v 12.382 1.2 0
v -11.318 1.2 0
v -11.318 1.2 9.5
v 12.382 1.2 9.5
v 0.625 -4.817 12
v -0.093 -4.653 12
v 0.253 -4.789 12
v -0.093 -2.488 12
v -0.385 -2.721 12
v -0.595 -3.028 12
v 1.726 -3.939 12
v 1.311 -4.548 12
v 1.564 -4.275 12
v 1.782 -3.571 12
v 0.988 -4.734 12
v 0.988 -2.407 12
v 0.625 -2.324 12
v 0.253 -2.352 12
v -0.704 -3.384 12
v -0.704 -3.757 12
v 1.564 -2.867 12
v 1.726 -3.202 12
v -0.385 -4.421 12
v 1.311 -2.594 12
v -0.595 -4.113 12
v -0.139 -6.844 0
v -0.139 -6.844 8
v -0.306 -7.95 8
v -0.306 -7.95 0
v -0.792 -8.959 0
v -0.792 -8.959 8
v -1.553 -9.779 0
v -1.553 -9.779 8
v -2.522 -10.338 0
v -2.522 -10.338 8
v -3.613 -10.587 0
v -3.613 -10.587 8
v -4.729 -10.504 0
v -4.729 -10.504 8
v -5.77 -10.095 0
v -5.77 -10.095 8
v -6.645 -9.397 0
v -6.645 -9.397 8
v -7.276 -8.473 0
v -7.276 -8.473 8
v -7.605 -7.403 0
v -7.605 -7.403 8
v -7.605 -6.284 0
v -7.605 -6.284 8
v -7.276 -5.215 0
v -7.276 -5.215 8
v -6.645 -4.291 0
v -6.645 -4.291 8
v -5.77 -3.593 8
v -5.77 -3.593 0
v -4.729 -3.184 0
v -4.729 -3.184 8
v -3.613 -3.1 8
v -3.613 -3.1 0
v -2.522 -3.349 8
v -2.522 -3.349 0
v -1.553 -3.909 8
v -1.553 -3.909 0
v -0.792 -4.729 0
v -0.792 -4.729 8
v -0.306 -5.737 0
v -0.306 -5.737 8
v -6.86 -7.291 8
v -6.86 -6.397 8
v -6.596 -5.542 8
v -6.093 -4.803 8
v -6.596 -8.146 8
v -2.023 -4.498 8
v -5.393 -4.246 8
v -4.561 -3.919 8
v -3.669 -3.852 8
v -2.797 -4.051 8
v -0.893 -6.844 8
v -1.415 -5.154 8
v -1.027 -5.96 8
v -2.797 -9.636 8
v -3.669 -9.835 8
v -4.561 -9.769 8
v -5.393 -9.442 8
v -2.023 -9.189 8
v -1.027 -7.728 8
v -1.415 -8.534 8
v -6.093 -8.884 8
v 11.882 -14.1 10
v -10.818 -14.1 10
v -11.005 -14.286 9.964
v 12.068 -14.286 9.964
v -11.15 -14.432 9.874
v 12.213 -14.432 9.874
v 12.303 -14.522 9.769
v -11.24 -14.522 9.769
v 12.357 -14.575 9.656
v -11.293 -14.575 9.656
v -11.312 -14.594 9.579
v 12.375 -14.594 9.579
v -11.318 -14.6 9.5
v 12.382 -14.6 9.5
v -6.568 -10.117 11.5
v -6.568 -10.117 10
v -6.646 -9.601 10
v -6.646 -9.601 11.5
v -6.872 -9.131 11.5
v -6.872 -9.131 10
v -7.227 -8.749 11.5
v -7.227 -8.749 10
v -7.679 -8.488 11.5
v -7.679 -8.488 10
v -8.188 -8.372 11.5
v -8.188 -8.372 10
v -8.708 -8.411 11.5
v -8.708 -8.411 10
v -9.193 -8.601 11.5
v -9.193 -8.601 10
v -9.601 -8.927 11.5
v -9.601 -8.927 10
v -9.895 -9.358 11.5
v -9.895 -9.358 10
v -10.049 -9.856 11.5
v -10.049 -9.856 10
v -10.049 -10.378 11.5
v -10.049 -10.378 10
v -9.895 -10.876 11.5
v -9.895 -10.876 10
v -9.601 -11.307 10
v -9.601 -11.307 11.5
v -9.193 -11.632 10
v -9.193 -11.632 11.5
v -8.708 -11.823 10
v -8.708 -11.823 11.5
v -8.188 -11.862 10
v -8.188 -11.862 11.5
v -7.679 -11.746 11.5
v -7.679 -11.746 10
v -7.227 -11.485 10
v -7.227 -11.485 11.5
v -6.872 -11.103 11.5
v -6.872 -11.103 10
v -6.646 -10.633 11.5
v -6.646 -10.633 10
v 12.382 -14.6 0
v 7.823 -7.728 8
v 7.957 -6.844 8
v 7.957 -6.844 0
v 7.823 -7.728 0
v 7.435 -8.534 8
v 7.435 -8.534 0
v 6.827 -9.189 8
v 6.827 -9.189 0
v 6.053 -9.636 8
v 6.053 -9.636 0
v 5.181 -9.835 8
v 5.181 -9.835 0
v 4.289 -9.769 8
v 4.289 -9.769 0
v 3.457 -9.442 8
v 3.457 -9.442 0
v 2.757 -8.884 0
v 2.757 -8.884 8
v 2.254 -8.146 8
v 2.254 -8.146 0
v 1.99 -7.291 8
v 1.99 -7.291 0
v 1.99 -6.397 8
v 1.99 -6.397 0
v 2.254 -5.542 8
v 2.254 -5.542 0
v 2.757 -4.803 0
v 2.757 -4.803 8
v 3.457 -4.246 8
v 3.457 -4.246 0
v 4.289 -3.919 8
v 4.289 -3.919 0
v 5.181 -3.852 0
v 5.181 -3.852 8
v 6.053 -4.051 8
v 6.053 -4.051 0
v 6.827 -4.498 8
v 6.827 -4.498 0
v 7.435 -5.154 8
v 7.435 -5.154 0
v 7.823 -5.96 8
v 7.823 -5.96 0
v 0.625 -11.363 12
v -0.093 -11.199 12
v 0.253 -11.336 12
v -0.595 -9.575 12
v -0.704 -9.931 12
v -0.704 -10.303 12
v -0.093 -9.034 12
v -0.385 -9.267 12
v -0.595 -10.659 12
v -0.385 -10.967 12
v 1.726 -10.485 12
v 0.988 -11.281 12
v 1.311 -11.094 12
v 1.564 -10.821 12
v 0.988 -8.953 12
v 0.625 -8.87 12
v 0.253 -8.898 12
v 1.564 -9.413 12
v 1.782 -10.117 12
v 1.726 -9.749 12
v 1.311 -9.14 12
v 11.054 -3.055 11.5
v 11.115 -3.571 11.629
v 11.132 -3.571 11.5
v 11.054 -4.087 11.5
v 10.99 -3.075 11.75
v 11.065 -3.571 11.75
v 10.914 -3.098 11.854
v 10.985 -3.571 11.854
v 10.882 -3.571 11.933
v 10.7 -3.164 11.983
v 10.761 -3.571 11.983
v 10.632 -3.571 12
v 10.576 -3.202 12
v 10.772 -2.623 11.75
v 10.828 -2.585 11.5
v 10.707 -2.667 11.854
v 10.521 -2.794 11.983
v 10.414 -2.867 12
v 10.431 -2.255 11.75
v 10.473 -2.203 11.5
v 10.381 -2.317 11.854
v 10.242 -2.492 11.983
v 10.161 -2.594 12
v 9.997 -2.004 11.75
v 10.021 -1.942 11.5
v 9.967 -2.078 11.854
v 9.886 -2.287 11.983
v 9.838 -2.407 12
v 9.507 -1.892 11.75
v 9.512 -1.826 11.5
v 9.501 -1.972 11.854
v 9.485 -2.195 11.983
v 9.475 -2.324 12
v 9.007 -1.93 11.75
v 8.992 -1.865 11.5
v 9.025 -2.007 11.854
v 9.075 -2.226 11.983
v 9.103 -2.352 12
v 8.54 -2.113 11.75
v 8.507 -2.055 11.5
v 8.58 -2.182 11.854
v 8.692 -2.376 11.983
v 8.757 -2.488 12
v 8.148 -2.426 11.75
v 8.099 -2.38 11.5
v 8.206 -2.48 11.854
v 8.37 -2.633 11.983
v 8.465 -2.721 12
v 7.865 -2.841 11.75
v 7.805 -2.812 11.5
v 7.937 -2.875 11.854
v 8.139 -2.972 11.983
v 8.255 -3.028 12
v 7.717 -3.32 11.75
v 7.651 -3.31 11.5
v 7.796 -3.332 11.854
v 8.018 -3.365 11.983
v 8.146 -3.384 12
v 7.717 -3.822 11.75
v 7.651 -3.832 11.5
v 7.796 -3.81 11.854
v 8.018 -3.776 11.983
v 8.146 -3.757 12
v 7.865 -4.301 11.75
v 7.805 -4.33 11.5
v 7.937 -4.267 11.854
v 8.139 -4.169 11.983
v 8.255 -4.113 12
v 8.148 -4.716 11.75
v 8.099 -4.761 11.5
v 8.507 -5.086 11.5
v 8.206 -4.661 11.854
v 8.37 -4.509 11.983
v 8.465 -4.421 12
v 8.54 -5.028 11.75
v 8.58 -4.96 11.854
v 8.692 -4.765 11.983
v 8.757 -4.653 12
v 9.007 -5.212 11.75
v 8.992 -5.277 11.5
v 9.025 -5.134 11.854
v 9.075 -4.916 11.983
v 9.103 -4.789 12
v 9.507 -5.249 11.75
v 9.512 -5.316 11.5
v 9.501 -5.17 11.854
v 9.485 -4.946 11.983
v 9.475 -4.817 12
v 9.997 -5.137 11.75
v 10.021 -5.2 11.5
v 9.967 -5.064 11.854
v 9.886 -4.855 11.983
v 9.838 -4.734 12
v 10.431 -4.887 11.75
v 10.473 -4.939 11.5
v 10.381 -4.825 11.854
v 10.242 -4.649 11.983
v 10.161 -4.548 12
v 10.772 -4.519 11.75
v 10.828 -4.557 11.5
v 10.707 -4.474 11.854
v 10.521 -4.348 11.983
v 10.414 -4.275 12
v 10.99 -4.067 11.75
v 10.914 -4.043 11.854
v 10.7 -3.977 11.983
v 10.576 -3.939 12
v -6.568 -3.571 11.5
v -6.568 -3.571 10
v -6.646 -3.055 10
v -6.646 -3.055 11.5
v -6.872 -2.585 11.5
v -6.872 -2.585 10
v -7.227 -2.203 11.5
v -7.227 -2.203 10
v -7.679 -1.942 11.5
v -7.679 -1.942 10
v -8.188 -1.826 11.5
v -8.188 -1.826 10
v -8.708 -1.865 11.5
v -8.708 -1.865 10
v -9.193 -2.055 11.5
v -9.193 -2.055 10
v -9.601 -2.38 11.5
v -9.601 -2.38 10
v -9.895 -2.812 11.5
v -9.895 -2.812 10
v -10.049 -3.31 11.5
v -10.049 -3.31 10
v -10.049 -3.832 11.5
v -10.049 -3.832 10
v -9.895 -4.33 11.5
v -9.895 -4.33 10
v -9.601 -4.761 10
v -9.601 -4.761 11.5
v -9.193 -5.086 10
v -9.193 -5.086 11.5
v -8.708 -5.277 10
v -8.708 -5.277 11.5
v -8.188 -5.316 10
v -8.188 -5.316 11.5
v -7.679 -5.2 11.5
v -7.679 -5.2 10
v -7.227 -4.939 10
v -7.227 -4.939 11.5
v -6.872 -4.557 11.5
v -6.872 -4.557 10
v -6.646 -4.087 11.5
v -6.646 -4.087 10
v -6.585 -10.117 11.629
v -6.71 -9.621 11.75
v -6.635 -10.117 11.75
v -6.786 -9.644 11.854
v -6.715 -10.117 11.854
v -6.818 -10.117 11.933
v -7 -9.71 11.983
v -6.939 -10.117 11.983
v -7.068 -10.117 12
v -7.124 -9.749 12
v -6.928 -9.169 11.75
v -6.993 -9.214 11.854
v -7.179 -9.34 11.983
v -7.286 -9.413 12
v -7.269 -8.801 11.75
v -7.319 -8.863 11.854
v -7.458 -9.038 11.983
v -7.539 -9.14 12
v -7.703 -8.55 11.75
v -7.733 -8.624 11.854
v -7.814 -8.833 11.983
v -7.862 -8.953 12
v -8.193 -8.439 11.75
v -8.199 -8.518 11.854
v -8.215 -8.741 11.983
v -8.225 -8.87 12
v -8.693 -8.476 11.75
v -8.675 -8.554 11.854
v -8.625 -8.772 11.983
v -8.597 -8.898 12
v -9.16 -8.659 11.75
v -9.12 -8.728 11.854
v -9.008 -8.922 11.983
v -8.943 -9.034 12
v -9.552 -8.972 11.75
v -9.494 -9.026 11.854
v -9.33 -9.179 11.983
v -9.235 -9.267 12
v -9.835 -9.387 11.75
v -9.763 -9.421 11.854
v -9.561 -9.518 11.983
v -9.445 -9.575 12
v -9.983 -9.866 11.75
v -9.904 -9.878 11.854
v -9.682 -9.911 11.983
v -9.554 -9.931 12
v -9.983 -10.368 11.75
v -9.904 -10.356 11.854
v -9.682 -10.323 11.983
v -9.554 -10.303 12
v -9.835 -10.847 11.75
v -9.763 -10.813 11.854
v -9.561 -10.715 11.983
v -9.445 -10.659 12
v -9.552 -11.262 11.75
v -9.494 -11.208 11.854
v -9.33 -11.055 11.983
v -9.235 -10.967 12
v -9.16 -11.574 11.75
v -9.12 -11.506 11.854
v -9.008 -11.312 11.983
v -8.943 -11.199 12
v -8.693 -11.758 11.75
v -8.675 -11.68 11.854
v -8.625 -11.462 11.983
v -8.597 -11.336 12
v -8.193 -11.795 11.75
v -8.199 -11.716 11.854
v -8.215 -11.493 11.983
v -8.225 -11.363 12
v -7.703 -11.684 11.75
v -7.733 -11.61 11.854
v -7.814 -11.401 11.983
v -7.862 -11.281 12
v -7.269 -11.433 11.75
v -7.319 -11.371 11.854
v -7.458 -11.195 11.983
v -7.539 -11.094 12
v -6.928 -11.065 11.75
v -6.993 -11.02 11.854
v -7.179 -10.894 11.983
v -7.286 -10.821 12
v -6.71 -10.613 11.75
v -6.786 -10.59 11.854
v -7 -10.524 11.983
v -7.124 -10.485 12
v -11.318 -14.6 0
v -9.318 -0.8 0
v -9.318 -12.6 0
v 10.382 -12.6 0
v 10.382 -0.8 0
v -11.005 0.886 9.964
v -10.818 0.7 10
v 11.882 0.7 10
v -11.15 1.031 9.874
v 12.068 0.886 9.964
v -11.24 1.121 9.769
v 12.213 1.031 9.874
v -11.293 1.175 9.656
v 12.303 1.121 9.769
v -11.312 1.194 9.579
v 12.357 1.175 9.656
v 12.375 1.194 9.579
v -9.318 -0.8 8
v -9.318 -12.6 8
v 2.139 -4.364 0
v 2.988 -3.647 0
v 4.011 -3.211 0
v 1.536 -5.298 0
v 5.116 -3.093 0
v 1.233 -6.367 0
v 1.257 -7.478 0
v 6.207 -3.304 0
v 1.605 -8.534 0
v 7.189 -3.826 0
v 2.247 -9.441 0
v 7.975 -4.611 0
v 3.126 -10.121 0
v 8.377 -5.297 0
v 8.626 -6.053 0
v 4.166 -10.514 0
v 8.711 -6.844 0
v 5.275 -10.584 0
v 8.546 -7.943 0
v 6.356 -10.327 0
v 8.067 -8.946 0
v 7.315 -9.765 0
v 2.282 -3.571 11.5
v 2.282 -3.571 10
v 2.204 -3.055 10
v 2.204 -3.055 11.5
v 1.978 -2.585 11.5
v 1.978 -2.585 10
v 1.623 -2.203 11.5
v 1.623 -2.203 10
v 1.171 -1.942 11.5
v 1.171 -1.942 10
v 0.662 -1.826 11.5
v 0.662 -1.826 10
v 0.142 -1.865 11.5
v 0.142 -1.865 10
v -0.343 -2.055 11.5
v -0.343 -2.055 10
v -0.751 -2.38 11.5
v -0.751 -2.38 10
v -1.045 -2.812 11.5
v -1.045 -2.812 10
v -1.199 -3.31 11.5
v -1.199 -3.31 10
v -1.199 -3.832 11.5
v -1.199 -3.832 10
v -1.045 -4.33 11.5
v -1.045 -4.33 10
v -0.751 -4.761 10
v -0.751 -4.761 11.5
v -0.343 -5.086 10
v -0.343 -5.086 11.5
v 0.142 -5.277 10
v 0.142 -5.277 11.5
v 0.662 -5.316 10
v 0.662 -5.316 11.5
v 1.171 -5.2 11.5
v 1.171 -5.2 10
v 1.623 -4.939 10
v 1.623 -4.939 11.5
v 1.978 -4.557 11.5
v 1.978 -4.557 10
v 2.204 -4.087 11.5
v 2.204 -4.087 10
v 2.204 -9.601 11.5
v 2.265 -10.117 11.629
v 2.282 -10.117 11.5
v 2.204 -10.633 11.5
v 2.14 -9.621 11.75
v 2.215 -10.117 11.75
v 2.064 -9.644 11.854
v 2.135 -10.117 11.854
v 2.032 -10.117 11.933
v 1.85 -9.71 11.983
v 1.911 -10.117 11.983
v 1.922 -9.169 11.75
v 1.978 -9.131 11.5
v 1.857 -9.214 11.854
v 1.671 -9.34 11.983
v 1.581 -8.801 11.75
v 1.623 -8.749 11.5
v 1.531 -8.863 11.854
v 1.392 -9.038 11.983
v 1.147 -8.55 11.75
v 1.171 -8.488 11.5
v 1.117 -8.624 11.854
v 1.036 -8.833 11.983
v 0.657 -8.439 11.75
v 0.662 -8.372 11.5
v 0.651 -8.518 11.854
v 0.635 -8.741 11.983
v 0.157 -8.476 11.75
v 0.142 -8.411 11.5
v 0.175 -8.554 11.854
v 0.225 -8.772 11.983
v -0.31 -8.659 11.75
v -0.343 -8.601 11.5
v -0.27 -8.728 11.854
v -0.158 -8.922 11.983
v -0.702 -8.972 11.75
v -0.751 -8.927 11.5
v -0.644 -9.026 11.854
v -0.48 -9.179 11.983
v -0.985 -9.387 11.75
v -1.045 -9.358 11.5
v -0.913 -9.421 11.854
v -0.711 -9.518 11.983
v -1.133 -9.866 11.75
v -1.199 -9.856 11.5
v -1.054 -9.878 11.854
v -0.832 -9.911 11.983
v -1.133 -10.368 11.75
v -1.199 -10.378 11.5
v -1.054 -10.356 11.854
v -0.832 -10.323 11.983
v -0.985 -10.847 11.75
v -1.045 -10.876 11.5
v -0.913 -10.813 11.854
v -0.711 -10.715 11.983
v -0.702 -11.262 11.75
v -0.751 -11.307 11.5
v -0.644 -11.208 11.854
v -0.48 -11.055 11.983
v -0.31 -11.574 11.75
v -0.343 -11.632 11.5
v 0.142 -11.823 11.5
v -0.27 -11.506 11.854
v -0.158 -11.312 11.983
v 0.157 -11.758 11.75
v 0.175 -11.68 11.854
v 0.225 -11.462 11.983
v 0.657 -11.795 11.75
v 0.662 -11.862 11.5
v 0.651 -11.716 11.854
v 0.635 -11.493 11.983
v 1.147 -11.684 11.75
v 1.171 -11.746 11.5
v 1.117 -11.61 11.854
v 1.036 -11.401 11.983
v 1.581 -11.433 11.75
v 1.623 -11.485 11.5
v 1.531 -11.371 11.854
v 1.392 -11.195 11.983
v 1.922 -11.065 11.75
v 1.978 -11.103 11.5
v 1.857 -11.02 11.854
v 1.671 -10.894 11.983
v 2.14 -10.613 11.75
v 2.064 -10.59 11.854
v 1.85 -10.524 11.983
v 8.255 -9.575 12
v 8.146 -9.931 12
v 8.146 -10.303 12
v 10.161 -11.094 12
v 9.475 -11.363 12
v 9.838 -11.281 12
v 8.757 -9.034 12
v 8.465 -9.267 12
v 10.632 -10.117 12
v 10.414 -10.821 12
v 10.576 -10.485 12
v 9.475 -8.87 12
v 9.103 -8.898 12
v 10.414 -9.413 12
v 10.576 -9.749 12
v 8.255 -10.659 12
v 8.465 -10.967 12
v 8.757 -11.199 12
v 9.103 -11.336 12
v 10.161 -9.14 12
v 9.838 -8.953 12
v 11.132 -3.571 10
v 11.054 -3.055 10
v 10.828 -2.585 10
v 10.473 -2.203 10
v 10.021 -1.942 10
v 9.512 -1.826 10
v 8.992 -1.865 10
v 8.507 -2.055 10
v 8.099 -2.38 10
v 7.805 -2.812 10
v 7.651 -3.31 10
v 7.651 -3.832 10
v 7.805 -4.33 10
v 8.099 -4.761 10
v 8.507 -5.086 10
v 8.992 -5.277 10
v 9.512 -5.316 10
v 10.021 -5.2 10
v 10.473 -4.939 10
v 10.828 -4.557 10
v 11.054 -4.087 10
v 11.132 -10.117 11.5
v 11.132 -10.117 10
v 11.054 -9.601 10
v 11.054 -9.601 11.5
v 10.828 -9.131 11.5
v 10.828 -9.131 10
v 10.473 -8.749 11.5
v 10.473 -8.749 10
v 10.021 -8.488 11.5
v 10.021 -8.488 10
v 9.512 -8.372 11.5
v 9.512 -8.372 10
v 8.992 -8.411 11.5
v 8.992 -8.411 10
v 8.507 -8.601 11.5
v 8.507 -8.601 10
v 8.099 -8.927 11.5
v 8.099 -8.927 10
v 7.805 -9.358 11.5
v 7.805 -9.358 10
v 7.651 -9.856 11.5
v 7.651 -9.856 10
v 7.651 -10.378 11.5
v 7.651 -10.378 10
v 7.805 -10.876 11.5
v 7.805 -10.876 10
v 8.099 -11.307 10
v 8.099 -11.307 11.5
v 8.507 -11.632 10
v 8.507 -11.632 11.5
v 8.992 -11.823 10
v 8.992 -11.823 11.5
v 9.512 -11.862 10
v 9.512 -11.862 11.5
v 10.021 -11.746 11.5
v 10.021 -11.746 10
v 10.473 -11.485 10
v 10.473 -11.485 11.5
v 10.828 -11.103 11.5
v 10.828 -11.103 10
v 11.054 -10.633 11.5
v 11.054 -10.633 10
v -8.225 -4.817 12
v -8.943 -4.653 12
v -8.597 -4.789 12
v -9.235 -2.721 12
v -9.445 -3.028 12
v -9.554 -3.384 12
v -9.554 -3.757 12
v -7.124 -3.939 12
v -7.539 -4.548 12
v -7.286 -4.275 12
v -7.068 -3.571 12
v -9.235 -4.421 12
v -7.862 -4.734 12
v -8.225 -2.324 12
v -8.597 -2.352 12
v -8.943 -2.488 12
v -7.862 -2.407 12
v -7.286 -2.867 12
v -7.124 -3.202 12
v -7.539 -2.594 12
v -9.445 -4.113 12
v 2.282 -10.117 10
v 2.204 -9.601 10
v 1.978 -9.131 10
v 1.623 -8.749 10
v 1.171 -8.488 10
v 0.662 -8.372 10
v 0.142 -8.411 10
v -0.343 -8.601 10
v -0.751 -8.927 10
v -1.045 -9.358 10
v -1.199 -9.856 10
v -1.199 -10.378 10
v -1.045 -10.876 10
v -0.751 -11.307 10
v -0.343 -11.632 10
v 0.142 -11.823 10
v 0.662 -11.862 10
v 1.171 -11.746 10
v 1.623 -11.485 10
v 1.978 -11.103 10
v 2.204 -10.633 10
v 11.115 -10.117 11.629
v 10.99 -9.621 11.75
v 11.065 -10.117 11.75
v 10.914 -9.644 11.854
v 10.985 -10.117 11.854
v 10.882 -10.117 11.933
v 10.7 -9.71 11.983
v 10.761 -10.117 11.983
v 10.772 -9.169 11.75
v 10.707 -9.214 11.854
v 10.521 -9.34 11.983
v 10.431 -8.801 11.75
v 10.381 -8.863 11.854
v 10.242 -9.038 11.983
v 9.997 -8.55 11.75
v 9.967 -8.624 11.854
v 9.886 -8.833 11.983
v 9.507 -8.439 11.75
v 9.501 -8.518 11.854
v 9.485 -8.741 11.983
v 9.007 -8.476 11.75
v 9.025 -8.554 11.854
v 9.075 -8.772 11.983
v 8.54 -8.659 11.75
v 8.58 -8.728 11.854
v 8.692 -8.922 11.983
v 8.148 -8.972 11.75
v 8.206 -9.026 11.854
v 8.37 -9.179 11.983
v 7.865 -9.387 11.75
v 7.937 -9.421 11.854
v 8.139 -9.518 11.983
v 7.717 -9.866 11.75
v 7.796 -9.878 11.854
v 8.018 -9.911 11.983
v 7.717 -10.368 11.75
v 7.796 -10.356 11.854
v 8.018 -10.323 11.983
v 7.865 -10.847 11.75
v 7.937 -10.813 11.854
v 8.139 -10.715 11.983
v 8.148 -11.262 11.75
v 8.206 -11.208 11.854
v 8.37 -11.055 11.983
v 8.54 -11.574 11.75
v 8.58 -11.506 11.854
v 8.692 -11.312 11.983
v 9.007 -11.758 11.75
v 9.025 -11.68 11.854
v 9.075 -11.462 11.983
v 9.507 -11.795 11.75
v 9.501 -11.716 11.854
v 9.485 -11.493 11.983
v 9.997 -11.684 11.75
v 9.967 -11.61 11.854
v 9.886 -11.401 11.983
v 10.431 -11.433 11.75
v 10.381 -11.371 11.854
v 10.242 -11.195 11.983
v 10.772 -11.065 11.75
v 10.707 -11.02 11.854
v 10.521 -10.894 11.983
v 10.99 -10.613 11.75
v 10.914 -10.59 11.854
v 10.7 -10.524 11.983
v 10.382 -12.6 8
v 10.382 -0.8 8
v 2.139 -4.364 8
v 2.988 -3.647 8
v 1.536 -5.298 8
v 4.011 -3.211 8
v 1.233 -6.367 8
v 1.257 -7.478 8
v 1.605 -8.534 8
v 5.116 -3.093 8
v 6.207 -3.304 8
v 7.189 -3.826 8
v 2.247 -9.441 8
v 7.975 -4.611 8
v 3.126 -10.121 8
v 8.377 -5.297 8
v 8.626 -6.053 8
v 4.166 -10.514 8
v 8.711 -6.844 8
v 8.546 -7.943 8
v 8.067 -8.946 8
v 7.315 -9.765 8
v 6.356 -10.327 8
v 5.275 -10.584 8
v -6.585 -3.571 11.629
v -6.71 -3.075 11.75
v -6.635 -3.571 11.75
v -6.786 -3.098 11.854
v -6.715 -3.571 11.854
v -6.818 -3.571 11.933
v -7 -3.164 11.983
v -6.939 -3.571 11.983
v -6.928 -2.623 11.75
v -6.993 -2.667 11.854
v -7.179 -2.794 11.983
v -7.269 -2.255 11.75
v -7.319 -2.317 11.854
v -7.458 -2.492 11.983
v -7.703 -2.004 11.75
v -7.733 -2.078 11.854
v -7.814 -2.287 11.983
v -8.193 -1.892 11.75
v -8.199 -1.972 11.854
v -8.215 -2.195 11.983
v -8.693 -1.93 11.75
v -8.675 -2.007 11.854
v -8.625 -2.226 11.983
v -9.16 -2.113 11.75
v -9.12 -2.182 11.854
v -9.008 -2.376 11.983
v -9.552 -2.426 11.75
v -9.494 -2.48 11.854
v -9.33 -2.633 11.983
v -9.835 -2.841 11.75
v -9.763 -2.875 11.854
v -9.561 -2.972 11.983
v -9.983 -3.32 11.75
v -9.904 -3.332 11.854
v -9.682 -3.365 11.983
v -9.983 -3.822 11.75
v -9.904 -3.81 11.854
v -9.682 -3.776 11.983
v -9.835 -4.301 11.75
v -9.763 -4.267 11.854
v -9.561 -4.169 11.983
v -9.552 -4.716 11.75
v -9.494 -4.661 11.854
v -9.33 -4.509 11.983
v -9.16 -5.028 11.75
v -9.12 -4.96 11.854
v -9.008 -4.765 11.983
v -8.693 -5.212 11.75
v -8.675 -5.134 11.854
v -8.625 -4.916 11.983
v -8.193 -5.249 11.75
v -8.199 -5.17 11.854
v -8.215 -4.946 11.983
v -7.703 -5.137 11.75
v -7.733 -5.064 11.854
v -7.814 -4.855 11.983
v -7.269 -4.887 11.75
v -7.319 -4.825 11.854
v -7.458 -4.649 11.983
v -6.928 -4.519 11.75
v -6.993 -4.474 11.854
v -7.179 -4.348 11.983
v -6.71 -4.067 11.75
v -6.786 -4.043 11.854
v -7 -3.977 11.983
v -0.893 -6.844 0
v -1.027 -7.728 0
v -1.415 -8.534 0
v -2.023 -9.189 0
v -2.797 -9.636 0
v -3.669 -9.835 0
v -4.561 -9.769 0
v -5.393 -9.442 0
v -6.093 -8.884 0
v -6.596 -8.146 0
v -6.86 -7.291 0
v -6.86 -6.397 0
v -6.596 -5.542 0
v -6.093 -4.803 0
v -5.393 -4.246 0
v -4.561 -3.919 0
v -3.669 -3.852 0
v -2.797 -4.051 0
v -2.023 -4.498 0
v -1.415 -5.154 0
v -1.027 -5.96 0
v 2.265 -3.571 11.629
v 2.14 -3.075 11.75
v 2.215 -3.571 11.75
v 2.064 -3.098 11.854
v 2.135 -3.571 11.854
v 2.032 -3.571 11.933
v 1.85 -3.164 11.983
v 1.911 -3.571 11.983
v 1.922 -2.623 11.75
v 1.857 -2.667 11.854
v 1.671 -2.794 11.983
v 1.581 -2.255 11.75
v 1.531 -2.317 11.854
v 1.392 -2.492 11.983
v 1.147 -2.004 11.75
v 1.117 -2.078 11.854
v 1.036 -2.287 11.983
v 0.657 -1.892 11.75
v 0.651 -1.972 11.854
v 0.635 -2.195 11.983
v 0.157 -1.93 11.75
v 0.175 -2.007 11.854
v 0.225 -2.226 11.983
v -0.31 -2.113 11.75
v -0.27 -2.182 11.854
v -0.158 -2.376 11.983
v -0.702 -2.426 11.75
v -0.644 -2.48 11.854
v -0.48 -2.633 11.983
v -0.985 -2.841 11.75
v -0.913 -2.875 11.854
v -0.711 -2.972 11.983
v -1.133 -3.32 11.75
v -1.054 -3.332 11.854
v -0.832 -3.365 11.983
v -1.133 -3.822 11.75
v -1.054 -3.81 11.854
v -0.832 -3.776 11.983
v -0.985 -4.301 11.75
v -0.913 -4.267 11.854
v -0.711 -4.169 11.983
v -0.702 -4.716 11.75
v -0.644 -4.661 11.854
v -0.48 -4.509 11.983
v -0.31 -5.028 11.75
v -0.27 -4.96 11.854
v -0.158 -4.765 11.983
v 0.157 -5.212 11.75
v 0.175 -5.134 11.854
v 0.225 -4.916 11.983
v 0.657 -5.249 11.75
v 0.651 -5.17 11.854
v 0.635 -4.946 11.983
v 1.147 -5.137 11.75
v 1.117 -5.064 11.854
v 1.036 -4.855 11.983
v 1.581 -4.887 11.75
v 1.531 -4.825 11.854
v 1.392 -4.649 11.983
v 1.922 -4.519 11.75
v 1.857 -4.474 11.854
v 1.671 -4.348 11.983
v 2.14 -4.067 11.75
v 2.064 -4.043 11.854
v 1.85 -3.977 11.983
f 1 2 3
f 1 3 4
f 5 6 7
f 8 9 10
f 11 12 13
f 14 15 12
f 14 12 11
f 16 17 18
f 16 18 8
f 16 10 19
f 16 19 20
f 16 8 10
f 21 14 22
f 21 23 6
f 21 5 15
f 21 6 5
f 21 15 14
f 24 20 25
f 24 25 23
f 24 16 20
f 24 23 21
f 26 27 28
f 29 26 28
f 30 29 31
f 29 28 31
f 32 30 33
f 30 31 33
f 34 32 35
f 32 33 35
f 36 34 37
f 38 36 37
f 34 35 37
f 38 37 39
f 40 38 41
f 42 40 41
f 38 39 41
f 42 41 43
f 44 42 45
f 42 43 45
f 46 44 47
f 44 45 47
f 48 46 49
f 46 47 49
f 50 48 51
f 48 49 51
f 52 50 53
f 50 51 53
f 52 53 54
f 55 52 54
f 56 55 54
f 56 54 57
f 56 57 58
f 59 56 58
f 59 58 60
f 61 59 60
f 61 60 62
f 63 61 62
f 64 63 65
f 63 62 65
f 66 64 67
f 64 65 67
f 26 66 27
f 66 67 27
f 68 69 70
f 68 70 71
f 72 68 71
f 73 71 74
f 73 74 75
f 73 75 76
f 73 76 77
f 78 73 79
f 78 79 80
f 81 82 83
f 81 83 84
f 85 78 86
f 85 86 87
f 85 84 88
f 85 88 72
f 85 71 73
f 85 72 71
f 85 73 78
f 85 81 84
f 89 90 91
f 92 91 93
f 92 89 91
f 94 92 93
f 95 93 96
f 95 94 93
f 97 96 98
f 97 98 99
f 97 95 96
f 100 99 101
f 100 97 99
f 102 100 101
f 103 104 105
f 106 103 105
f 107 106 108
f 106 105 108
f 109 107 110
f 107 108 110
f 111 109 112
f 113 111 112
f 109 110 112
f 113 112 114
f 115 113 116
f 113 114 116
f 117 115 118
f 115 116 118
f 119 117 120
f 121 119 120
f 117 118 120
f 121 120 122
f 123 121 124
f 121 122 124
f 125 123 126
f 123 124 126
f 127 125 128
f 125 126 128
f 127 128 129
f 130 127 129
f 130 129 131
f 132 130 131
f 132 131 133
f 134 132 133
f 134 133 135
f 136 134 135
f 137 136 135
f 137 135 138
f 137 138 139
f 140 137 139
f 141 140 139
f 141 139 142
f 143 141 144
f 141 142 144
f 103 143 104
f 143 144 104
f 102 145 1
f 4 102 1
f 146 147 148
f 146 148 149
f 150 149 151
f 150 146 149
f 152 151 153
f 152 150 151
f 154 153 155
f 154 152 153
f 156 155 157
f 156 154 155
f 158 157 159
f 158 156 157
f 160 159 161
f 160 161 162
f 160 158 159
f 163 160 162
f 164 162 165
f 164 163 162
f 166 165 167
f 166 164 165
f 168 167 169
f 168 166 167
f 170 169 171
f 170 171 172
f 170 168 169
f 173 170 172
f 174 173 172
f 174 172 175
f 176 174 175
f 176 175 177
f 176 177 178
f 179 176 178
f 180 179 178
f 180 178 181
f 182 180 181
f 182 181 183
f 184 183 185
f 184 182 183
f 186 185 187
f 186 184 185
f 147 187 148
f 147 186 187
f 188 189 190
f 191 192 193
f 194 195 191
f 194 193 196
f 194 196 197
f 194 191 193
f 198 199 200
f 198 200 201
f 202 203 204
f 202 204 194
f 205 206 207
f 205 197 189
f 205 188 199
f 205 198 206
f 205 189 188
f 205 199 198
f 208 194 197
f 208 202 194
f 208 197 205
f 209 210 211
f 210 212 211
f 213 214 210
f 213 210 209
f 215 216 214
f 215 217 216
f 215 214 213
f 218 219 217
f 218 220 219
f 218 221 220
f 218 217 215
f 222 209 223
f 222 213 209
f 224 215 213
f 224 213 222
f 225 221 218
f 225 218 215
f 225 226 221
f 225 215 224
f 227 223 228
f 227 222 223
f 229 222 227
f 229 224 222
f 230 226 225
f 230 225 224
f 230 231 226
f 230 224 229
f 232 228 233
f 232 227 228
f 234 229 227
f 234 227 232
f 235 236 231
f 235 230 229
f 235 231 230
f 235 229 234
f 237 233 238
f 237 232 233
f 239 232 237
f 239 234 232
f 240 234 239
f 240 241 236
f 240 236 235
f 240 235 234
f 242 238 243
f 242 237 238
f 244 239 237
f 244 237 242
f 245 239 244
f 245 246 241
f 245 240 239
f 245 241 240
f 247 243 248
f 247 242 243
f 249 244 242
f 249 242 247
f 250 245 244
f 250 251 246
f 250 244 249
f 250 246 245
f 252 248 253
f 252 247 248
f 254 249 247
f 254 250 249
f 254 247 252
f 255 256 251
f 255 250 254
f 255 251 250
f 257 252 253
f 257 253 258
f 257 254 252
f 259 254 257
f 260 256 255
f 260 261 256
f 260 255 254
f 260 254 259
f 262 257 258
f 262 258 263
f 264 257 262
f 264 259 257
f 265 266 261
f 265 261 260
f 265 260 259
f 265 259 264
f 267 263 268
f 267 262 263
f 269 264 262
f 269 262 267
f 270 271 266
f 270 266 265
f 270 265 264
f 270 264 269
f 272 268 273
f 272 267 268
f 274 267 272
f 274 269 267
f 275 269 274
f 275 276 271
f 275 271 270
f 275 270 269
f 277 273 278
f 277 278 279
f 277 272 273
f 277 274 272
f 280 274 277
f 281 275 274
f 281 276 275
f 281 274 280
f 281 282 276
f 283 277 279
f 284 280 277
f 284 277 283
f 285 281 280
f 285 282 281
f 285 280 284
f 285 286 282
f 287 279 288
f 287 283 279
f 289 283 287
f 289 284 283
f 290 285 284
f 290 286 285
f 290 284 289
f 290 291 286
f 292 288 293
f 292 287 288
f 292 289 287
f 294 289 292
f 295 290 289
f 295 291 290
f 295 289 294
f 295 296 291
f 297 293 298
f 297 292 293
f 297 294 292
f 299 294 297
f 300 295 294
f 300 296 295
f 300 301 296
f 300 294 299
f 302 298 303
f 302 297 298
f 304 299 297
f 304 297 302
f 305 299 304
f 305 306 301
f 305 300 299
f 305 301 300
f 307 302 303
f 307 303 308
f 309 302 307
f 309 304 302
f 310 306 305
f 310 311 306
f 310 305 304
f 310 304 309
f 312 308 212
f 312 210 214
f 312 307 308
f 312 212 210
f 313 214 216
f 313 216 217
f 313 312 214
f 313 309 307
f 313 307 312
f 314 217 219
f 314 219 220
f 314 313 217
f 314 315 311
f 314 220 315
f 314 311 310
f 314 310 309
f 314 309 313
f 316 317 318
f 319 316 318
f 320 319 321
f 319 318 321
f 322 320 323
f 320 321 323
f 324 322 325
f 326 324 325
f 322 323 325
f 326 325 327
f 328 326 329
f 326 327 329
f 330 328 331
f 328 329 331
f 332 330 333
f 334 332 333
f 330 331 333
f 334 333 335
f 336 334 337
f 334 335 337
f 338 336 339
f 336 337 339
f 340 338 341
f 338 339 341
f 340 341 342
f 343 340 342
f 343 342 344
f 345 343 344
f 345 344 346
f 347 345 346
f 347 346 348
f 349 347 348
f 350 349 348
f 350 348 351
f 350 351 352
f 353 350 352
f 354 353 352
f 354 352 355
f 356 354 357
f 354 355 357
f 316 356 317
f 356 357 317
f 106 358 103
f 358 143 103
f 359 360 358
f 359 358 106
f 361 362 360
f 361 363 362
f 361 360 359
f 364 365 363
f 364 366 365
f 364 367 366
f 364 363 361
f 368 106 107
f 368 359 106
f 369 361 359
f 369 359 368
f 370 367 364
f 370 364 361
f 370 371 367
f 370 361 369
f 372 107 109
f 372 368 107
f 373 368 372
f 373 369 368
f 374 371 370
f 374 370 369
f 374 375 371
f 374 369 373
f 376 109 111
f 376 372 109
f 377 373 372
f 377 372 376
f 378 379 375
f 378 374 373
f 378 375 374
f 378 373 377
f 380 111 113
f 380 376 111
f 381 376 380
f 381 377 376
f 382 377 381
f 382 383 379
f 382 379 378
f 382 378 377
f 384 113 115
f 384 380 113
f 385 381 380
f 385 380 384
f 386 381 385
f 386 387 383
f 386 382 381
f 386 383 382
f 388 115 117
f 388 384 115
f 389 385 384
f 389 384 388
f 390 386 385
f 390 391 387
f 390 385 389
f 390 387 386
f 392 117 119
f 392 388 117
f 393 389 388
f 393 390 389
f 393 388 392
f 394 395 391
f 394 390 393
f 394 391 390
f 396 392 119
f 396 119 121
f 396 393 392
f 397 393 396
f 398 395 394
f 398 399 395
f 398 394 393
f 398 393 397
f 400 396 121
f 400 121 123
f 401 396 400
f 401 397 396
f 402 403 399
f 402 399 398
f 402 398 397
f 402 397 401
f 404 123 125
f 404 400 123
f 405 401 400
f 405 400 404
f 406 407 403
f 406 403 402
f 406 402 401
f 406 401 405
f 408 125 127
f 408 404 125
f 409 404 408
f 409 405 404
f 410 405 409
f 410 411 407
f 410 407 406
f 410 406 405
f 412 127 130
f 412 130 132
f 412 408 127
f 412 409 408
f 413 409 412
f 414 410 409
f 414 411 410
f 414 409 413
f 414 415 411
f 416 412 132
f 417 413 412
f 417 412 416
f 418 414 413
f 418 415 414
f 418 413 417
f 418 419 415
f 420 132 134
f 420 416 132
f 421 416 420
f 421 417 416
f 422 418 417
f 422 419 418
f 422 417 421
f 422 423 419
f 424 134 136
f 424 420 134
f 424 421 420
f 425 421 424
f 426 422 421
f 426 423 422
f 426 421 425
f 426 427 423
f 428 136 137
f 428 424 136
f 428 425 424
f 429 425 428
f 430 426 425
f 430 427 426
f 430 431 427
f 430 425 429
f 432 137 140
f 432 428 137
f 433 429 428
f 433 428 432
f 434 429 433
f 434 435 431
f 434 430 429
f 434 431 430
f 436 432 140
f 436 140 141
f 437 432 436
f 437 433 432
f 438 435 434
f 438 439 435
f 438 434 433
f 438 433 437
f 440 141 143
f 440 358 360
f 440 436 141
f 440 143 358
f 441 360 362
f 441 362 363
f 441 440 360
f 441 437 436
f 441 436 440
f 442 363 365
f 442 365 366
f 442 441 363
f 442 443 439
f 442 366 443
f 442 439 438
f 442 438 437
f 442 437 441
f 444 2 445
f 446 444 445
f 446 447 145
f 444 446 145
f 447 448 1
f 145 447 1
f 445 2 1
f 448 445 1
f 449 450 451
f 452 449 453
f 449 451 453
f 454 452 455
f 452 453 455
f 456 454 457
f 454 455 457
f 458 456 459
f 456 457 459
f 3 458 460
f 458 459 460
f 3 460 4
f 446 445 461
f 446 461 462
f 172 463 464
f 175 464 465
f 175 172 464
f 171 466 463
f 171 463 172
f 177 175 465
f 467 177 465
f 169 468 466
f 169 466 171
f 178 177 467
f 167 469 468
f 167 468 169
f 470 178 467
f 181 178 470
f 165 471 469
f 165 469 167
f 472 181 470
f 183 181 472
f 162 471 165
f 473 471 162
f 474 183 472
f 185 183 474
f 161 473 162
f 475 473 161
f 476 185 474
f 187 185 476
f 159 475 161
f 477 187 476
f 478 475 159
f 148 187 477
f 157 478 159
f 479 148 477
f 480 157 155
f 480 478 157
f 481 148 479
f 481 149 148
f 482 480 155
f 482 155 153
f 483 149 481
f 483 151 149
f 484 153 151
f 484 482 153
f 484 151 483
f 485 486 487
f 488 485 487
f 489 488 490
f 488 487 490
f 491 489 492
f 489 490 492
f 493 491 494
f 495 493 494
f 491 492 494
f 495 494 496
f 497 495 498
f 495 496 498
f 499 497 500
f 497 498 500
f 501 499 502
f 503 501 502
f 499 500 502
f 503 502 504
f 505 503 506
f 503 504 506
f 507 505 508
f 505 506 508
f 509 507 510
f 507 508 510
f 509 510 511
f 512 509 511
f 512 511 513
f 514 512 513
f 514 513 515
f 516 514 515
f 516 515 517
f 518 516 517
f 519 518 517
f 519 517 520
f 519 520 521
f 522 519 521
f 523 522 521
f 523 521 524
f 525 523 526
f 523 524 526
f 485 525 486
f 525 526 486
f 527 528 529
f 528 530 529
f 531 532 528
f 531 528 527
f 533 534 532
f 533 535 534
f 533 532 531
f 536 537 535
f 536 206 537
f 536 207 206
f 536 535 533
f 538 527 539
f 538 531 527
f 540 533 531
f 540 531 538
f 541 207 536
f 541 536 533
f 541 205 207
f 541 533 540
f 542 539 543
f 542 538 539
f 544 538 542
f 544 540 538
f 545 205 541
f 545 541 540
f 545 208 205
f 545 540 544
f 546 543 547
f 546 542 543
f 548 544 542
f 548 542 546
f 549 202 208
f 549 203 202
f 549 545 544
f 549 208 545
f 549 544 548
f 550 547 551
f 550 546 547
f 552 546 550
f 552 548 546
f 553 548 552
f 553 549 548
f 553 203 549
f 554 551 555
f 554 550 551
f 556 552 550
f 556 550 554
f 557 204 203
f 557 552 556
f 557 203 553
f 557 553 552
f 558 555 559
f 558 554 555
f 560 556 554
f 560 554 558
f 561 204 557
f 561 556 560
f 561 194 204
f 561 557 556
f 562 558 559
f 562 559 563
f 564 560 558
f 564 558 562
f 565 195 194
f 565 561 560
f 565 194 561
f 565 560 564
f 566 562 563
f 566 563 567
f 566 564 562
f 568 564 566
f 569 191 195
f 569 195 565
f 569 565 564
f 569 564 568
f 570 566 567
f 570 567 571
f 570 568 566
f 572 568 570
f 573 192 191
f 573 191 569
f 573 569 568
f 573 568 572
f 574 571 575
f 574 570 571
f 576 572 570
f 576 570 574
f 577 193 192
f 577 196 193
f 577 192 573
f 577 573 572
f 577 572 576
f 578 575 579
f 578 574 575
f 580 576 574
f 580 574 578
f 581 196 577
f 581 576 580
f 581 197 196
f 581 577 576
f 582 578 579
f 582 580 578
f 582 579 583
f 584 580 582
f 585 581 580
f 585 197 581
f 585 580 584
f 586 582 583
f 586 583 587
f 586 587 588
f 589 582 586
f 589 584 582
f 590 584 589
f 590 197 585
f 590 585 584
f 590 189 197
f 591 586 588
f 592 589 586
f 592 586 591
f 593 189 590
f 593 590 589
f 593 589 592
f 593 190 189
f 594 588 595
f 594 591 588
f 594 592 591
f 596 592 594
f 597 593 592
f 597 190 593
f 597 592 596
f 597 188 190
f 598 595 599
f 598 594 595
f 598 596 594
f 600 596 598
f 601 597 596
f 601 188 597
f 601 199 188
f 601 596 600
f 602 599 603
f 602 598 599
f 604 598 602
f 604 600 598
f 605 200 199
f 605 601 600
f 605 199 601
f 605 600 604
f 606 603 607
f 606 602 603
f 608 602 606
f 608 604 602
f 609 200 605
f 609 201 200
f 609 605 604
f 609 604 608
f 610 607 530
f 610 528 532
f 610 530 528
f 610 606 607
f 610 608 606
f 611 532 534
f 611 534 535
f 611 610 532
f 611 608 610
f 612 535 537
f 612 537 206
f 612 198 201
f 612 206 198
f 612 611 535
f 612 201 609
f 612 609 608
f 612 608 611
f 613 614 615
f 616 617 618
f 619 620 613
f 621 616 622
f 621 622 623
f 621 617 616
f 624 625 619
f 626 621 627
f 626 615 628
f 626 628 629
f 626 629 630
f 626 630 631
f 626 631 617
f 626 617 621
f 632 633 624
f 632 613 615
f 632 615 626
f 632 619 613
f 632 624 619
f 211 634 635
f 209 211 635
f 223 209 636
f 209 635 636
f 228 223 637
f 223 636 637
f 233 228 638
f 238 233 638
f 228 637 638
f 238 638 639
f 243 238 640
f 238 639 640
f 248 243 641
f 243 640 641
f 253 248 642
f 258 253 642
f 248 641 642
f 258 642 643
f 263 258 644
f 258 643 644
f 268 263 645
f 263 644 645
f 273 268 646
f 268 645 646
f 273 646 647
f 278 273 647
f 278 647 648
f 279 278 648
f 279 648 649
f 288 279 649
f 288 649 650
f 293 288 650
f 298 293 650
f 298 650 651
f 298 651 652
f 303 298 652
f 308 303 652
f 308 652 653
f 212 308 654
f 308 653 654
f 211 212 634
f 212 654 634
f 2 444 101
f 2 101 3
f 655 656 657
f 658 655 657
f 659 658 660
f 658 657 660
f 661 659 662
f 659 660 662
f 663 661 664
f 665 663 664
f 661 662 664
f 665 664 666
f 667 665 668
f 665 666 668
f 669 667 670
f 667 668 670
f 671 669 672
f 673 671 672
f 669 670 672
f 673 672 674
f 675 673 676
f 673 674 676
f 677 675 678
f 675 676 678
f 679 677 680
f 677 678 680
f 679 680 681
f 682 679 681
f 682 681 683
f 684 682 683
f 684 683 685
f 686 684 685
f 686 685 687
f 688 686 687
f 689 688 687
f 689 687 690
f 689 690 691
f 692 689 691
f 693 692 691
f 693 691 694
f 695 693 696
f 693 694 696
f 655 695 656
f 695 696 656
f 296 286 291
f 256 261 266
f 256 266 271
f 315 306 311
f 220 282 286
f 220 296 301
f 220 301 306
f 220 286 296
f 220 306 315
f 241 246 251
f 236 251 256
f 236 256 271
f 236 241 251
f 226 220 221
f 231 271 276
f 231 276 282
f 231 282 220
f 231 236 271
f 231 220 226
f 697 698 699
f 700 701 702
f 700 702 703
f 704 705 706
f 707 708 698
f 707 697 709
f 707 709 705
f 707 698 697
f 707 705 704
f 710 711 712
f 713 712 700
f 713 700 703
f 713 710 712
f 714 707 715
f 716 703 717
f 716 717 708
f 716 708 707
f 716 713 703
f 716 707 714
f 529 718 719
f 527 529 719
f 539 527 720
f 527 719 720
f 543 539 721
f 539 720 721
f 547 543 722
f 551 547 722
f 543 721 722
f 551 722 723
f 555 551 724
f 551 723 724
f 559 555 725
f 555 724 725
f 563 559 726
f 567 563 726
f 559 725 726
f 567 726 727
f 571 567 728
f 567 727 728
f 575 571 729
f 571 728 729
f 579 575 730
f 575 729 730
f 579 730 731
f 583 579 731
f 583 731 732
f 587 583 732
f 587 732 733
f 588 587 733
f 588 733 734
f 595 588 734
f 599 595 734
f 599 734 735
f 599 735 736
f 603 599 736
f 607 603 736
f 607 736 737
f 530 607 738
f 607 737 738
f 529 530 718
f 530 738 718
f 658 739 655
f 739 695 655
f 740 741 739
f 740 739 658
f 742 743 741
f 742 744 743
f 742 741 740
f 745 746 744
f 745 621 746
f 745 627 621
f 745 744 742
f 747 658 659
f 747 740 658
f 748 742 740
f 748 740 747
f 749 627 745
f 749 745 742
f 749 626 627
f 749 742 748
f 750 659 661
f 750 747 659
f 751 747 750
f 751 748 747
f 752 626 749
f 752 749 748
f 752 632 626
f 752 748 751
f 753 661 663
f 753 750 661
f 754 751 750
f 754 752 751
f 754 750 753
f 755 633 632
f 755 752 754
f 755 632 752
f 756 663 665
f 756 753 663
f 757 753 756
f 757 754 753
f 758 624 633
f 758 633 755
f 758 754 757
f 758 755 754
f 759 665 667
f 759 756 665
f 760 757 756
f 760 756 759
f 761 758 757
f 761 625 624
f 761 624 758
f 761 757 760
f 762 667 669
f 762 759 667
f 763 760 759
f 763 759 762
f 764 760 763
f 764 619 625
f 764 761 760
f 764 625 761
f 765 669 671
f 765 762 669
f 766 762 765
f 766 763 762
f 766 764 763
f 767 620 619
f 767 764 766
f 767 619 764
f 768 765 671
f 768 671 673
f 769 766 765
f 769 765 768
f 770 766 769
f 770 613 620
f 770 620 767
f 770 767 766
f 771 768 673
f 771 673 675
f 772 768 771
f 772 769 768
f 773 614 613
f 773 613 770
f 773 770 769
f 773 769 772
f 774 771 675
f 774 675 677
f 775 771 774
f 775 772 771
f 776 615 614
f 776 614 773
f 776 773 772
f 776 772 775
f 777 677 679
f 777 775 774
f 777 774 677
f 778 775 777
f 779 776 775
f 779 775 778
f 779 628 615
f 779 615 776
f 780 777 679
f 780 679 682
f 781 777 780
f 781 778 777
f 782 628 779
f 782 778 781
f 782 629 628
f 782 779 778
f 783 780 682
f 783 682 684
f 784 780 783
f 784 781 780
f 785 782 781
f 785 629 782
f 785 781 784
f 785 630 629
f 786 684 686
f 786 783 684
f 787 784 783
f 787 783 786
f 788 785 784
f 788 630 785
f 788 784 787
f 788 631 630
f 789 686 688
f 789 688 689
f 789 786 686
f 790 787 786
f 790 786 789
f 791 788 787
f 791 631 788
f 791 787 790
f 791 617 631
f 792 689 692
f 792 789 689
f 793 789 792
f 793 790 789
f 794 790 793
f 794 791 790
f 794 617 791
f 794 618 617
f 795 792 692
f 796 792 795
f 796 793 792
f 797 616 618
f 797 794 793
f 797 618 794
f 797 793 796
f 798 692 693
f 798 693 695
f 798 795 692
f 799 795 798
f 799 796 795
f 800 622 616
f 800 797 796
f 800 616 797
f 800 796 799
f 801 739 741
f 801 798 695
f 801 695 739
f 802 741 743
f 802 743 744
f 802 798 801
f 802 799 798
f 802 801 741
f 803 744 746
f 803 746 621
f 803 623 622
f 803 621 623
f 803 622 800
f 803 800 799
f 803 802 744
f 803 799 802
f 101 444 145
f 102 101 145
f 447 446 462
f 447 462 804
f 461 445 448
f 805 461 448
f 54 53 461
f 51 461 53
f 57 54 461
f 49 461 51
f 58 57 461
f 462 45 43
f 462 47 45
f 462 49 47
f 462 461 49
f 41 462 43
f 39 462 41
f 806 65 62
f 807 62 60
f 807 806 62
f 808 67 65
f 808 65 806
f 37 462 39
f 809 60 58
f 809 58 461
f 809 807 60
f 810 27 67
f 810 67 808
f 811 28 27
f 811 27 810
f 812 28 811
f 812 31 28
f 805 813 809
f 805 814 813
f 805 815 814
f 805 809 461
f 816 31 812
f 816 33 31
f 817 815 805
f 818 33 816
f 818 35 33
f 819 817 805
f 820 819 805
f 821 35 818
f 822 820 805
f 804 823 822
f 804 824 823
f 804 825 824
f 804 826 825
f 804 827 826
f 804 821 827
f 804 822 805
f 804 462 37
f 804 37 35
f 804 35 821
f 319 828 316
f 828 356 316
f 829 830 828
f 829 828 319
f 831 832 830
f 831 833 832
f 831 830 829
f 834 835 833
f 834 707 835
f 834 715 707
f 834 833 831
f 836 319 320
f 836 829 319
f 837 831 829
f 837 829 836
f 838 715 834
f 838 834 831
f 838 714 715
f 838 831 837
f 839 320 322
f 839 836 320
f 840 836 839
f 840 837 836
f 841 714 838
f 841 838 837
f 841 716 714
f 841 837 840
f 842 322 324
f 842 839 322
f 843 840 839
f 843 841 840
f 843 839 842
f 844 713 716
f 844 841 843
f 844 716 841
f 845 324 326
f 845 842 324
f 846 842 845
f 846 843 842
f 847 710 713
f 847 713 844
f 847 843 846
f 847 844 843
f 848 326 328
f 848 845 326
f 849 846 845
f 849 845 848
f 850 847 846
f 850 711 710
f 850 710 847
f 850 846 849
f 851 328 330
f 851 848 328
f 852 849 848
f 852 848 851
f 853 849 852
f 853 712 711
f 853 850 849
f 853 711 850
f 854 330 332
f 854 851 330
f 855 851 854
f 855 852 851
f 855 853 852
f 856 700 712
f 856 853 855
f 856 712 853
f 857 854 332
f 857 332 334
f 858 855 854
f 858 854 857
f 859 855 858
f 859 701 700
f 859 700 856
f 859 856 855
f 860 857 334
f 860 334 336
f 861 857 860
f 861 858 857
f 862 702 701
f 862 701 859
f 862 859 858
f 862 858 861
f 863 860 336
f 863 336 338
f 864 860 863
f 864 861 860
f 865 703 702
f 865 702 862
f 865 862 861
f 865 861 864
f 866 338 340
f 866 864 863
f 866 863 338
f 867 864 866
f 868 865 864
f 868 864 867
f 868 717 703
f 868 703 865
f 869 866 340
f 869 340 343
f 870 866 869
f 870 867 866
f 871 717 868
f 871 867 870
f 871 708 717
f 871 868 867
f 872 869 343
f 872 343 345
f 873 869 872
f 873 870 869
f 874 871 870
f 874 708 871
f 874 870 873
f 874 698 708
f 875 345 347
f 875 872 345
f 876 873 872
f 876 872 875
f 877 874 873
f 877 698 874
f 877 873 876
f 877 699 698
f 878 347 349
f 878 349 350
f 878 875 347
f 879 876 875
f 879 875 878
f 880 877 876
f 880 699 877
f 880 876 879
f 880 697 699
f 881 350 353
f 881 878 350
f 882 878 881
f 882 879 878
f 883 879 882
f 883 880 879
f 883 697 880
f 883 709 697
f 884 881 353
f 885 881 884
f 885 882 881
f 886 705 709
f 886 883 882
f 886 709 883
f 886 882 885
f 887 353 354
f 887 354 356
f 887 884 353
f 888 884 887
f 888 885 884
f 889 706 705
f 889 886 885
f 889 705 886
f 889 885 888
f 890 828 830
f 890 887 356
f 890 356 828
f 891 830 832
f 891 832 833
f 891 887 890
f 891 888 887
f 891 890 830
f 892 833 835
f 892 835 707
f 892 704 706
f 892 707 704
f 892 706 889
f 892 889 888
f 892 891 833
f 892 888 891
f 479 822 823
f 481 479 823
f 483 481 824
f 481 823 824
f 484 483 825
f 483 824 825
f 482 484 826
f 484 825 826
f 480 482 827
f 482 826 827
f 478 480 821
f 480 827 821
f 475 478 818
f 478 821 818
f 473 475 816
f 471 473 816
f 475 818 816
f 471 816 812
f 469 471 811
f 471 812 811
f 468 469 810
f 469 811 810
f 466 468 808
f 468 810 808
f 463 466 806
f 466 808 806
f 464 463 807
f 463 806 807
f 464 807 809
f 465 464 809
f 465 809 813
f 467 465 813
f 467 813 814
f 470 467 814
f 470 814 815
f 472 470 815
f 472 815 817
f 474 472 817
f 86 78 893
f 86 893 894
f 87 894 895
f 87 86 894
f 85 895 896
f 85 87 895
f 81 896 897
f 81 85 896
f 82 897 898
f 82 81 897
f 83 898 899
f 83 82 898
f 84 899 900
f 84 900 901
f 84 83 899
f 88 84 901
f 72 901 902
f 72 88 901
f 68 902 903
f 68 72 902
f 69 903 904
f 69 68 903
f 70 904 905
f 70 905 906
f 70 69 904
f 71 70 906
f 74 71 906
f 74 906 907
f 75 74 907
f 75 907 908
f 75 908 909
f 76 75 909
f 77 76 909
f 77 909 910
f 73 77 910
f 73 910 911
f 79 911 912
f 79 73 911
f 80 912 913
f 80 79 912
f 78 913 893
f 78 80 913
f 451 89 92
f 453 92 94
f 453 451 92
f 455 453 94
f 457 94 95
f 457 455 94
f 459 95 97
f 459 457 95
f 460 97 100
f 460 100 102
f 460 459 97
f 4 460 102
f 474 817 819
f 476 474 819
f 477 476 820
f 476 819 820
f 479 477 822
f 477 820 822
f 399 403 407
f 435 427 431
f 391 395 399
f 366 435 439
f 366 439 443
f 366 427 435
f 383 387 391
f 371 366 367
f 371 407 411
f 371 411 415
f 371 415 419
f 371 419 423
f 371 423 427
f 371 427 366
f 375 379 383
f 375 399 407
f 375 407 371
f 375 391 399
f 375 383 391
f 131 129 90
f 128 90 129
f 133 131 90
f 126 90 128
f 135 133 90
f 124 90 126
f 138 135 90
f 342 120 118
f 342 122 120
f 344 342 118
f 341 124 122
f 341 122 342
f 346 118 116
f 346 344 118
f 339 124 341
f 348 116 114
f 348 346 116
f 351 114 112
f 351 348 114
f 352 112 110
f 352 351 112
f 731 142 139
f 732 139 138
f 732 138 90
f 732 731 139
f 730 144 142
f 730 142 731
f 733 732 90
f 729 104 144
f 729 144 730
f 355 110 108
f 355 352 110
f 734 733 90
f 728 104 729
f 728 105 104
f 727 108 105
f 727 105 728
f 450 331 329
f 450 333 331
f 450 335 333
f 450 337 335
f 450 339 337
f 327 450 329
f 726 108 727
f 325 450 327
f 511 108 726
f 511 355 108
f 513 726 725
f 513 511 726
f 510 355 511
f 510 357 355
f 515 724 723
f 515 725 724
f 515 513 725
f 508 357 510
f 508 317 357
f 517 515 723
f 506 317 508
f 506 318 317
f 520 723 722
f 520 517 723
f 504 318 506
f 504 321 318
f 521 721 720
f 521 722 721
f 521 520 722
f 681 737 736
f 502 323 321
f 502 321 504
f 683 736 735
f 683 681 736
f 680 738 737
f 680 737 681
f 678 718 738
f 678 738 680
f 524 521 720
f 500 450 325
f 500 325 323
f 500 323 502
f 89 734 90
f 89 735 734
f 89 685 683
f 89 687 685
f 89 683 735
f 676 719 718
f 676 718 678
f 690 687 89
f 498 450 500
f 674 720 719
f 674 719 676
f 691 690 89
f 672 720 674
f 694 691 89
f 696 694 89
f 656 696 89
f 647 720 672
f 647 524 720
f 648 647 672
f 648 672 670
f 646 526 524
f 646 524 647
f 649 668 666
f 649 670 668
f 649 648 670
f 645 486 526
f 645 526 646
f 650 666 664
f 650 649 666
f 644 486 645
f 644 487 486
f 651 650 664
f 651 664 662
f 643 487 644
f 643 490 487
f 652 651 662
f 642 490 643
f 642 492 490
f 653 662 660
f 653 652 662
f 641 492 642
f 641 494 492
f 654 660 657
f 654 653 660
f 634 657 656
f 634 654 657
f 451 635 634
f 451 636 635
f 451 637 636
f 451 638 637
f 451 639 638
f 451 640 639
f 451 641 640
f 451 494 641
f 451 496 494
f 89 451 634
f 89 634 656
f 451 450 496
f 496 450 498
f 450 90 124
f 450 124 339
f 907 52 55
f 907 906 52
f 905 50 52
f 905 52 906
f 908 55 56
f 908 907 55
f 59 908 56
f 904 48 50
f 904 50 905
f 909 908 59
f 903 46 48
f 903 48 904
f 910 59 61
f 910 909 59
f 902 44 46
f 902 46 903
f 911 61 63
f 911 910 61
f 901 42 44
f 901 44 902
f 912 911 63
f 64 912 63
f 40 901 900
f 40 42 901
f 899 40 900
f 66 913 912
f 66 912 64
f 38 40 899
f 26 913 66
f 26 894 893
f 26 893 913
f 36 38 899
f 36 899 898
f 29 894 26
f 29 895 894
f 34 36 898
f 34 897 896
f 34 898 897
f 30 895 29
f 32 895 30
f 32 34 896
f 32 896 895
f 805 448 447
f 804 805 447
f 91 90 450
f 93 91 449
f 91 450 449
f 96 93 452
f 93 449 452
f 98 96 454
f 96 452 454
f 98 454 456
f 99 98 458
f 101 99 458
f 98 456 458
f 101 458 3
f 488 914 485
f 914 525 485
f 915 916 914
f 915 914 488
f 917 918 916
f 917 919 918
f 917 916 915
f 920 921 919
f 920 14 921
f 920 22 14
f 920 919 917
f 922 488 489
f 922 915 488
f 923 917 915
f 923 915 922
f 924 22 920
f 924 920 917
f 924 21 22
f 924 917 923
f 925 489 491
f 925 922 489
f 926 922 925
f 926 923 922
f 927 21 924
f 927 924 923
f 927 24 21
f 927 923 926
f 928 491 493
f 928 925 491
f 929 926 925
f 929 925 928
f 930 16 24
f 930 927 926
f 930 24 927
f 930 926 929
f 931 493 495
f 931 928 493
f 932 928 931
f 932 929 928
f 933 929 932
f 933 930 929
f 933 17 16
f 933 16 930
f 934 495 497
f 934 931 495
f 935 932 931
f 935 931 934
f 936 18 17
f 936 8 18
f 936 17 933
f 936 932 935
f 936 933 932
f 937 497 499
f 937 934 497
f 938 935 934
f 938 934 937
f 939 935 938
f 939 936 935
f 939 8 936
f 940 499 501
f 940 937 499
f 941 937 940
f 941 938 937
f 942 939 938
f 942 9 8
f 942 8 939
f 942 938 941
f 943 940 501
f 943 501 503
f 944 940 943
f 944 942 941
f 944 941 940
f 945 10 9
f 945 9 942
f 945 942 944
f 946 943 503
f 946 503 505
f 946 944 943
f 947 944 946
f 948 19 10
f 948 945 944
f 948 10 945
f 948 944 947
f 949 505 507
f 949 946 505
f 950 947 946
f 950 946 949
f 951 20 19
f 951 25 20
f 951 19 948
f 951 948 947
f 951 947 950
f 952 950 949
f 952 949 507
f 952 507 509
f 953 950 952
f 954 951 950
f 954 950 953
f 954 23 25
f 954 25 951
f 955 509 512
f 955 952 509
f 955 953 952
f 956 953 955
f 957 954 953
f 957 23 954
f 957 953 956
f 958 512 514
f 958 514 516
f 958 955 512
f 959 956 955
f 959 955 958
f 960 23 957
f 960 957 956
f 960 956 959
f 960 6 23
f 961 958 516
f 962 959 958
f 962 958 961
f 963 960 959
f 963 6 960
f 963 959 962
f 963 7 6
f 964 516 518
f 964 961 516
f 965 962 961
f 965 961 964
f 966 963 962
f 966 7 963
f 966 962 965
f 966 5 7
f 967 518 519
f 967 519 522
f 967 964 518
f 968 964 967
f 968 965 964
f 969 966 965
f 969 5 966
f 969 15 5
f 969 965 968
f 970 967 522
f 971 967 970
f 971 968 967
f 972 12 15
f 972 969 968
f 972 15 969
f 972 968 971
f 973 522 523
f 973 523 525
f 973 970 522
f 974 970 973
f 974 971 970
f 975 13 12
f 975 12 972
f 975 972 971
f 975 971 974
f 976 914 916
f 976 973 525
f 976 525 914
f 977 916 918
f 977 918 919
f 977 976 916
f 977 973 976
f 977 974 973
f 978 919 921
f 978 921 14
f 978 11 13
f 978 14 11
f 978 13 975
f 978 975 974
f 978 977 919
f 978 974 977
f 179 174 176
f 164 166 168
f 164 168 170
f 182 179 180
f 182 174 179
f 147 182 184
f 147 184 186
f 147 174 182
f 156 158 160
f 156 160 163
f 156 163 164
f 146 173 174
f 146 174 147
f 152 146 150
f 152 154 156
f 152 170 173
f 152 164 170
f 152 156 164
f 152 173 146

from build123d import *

# Parameters (mm, degrees)
F0_W     = 23.7
F0_H     = 15.8
F2_DEPTH = 10
F3_W     = 19.7
F3_H     = 11.8
F4_DEPTH = 8
F5_R     = 1.75
F6_DEPTH = 2
F7_R     = 3.753967
F7_R_2   = 3
F9_DEPTH = 8
F10_R    = 0.5
F11_R    = 0.5


with BuildPart() as f2:
    # F0 (on Top) → F2 (new body)
    with BuildSketch(Plane.XY):
        with Locations((0.531648, -6.700218)):
            Rectangle(F0_W, F0_H)
    extrude(amount=F2_DEPTH)

    # F3 (on face) → F4 (cut)
    with BuildSketch(Plane(origin=(0, 0, 0), x_dir=(1, 0, 0), z_dir=(0, 0, -1))):
        with Locations((0.531648, 6.700218)):
            Rectangle(F3_W, F3_H)
    extrude(amount=-F4_DEPTH, mode=Mode.SUBTRACT)

    # F5 (on face) → F6 (join)
    with BuildSketch(Plane.XY.offset(10)):
        with Locations((-8.318352, -10.116949)):
            Circle(F5_R)
        with Locations((0.531648, -10.116949)):
            Circle(F5_R)
        with Locations((9.381648, -10.116949)):
            Circle(F5_R)
        with Locations((0.531648, -3.570797)):
            Circle(F5_R)
        with Locations((9.381648, -3.570797)):
            Circle(F5_R)
        with Locations((-8.318352, -3.570797)):
            Circle(F5_R)
    extrude(amount=F6_DEPTH)

    # F7 (on face) → F9 (join)
    with BuildSketch(Plane(origin=(0, 0, 8), x_dir=(1, 0, 0), z_dir=(0, 0, -1))):
        with Locations((-3.893352, 6.843873)):
            Circle(F7_R)
        with Locations((-3.893352, 6.843873)):
            Circle(F7_R_2, mode=Mode.SUBTRACT)
        with BuildLine():
            ThreePointArc((8.710615, 6.843873), (1.391402, 8.019154), (7.974709, 4.61148))
            ThreePointArc((7.974709, 4.61148), (8.521895, 5.668592), (8.710615, 6.843873))
        make_face()
        with Locations((4.956648, 6.843873)):
            Circle(F7_R_2, mode=Mode.SUBTRACT)
    extrude(amount=F9_DEPTH)

    # F10
    f10_edges = [f2.edges().sort_by_distance(p)[0] for p in [
        (-1.218352, -10.116949, 12),
        (-10.068352, -10.116949, 12),
        (-10.068352, -3.570797, 12),
        (7.631648, -3.570797, 12),
        (7.631648, -10.116949, 12),
        (-1.218352, -3.570797, 12),
    ]]
    fillet(f10_edges, radius=F10_R)

    # F11
    f11_edges = [f2.edges().sort_by_distance(p)[0] for p in [
        (0.531648, -14.600218, 10),
        (12.381648, -6.700218, 10),
        (0.531648, 1.199782, 10),
        (-11.318352, -6.700218, 10),
    ]]
    fillet(f11_edges, radius=F11_R)


solid = f2.part
